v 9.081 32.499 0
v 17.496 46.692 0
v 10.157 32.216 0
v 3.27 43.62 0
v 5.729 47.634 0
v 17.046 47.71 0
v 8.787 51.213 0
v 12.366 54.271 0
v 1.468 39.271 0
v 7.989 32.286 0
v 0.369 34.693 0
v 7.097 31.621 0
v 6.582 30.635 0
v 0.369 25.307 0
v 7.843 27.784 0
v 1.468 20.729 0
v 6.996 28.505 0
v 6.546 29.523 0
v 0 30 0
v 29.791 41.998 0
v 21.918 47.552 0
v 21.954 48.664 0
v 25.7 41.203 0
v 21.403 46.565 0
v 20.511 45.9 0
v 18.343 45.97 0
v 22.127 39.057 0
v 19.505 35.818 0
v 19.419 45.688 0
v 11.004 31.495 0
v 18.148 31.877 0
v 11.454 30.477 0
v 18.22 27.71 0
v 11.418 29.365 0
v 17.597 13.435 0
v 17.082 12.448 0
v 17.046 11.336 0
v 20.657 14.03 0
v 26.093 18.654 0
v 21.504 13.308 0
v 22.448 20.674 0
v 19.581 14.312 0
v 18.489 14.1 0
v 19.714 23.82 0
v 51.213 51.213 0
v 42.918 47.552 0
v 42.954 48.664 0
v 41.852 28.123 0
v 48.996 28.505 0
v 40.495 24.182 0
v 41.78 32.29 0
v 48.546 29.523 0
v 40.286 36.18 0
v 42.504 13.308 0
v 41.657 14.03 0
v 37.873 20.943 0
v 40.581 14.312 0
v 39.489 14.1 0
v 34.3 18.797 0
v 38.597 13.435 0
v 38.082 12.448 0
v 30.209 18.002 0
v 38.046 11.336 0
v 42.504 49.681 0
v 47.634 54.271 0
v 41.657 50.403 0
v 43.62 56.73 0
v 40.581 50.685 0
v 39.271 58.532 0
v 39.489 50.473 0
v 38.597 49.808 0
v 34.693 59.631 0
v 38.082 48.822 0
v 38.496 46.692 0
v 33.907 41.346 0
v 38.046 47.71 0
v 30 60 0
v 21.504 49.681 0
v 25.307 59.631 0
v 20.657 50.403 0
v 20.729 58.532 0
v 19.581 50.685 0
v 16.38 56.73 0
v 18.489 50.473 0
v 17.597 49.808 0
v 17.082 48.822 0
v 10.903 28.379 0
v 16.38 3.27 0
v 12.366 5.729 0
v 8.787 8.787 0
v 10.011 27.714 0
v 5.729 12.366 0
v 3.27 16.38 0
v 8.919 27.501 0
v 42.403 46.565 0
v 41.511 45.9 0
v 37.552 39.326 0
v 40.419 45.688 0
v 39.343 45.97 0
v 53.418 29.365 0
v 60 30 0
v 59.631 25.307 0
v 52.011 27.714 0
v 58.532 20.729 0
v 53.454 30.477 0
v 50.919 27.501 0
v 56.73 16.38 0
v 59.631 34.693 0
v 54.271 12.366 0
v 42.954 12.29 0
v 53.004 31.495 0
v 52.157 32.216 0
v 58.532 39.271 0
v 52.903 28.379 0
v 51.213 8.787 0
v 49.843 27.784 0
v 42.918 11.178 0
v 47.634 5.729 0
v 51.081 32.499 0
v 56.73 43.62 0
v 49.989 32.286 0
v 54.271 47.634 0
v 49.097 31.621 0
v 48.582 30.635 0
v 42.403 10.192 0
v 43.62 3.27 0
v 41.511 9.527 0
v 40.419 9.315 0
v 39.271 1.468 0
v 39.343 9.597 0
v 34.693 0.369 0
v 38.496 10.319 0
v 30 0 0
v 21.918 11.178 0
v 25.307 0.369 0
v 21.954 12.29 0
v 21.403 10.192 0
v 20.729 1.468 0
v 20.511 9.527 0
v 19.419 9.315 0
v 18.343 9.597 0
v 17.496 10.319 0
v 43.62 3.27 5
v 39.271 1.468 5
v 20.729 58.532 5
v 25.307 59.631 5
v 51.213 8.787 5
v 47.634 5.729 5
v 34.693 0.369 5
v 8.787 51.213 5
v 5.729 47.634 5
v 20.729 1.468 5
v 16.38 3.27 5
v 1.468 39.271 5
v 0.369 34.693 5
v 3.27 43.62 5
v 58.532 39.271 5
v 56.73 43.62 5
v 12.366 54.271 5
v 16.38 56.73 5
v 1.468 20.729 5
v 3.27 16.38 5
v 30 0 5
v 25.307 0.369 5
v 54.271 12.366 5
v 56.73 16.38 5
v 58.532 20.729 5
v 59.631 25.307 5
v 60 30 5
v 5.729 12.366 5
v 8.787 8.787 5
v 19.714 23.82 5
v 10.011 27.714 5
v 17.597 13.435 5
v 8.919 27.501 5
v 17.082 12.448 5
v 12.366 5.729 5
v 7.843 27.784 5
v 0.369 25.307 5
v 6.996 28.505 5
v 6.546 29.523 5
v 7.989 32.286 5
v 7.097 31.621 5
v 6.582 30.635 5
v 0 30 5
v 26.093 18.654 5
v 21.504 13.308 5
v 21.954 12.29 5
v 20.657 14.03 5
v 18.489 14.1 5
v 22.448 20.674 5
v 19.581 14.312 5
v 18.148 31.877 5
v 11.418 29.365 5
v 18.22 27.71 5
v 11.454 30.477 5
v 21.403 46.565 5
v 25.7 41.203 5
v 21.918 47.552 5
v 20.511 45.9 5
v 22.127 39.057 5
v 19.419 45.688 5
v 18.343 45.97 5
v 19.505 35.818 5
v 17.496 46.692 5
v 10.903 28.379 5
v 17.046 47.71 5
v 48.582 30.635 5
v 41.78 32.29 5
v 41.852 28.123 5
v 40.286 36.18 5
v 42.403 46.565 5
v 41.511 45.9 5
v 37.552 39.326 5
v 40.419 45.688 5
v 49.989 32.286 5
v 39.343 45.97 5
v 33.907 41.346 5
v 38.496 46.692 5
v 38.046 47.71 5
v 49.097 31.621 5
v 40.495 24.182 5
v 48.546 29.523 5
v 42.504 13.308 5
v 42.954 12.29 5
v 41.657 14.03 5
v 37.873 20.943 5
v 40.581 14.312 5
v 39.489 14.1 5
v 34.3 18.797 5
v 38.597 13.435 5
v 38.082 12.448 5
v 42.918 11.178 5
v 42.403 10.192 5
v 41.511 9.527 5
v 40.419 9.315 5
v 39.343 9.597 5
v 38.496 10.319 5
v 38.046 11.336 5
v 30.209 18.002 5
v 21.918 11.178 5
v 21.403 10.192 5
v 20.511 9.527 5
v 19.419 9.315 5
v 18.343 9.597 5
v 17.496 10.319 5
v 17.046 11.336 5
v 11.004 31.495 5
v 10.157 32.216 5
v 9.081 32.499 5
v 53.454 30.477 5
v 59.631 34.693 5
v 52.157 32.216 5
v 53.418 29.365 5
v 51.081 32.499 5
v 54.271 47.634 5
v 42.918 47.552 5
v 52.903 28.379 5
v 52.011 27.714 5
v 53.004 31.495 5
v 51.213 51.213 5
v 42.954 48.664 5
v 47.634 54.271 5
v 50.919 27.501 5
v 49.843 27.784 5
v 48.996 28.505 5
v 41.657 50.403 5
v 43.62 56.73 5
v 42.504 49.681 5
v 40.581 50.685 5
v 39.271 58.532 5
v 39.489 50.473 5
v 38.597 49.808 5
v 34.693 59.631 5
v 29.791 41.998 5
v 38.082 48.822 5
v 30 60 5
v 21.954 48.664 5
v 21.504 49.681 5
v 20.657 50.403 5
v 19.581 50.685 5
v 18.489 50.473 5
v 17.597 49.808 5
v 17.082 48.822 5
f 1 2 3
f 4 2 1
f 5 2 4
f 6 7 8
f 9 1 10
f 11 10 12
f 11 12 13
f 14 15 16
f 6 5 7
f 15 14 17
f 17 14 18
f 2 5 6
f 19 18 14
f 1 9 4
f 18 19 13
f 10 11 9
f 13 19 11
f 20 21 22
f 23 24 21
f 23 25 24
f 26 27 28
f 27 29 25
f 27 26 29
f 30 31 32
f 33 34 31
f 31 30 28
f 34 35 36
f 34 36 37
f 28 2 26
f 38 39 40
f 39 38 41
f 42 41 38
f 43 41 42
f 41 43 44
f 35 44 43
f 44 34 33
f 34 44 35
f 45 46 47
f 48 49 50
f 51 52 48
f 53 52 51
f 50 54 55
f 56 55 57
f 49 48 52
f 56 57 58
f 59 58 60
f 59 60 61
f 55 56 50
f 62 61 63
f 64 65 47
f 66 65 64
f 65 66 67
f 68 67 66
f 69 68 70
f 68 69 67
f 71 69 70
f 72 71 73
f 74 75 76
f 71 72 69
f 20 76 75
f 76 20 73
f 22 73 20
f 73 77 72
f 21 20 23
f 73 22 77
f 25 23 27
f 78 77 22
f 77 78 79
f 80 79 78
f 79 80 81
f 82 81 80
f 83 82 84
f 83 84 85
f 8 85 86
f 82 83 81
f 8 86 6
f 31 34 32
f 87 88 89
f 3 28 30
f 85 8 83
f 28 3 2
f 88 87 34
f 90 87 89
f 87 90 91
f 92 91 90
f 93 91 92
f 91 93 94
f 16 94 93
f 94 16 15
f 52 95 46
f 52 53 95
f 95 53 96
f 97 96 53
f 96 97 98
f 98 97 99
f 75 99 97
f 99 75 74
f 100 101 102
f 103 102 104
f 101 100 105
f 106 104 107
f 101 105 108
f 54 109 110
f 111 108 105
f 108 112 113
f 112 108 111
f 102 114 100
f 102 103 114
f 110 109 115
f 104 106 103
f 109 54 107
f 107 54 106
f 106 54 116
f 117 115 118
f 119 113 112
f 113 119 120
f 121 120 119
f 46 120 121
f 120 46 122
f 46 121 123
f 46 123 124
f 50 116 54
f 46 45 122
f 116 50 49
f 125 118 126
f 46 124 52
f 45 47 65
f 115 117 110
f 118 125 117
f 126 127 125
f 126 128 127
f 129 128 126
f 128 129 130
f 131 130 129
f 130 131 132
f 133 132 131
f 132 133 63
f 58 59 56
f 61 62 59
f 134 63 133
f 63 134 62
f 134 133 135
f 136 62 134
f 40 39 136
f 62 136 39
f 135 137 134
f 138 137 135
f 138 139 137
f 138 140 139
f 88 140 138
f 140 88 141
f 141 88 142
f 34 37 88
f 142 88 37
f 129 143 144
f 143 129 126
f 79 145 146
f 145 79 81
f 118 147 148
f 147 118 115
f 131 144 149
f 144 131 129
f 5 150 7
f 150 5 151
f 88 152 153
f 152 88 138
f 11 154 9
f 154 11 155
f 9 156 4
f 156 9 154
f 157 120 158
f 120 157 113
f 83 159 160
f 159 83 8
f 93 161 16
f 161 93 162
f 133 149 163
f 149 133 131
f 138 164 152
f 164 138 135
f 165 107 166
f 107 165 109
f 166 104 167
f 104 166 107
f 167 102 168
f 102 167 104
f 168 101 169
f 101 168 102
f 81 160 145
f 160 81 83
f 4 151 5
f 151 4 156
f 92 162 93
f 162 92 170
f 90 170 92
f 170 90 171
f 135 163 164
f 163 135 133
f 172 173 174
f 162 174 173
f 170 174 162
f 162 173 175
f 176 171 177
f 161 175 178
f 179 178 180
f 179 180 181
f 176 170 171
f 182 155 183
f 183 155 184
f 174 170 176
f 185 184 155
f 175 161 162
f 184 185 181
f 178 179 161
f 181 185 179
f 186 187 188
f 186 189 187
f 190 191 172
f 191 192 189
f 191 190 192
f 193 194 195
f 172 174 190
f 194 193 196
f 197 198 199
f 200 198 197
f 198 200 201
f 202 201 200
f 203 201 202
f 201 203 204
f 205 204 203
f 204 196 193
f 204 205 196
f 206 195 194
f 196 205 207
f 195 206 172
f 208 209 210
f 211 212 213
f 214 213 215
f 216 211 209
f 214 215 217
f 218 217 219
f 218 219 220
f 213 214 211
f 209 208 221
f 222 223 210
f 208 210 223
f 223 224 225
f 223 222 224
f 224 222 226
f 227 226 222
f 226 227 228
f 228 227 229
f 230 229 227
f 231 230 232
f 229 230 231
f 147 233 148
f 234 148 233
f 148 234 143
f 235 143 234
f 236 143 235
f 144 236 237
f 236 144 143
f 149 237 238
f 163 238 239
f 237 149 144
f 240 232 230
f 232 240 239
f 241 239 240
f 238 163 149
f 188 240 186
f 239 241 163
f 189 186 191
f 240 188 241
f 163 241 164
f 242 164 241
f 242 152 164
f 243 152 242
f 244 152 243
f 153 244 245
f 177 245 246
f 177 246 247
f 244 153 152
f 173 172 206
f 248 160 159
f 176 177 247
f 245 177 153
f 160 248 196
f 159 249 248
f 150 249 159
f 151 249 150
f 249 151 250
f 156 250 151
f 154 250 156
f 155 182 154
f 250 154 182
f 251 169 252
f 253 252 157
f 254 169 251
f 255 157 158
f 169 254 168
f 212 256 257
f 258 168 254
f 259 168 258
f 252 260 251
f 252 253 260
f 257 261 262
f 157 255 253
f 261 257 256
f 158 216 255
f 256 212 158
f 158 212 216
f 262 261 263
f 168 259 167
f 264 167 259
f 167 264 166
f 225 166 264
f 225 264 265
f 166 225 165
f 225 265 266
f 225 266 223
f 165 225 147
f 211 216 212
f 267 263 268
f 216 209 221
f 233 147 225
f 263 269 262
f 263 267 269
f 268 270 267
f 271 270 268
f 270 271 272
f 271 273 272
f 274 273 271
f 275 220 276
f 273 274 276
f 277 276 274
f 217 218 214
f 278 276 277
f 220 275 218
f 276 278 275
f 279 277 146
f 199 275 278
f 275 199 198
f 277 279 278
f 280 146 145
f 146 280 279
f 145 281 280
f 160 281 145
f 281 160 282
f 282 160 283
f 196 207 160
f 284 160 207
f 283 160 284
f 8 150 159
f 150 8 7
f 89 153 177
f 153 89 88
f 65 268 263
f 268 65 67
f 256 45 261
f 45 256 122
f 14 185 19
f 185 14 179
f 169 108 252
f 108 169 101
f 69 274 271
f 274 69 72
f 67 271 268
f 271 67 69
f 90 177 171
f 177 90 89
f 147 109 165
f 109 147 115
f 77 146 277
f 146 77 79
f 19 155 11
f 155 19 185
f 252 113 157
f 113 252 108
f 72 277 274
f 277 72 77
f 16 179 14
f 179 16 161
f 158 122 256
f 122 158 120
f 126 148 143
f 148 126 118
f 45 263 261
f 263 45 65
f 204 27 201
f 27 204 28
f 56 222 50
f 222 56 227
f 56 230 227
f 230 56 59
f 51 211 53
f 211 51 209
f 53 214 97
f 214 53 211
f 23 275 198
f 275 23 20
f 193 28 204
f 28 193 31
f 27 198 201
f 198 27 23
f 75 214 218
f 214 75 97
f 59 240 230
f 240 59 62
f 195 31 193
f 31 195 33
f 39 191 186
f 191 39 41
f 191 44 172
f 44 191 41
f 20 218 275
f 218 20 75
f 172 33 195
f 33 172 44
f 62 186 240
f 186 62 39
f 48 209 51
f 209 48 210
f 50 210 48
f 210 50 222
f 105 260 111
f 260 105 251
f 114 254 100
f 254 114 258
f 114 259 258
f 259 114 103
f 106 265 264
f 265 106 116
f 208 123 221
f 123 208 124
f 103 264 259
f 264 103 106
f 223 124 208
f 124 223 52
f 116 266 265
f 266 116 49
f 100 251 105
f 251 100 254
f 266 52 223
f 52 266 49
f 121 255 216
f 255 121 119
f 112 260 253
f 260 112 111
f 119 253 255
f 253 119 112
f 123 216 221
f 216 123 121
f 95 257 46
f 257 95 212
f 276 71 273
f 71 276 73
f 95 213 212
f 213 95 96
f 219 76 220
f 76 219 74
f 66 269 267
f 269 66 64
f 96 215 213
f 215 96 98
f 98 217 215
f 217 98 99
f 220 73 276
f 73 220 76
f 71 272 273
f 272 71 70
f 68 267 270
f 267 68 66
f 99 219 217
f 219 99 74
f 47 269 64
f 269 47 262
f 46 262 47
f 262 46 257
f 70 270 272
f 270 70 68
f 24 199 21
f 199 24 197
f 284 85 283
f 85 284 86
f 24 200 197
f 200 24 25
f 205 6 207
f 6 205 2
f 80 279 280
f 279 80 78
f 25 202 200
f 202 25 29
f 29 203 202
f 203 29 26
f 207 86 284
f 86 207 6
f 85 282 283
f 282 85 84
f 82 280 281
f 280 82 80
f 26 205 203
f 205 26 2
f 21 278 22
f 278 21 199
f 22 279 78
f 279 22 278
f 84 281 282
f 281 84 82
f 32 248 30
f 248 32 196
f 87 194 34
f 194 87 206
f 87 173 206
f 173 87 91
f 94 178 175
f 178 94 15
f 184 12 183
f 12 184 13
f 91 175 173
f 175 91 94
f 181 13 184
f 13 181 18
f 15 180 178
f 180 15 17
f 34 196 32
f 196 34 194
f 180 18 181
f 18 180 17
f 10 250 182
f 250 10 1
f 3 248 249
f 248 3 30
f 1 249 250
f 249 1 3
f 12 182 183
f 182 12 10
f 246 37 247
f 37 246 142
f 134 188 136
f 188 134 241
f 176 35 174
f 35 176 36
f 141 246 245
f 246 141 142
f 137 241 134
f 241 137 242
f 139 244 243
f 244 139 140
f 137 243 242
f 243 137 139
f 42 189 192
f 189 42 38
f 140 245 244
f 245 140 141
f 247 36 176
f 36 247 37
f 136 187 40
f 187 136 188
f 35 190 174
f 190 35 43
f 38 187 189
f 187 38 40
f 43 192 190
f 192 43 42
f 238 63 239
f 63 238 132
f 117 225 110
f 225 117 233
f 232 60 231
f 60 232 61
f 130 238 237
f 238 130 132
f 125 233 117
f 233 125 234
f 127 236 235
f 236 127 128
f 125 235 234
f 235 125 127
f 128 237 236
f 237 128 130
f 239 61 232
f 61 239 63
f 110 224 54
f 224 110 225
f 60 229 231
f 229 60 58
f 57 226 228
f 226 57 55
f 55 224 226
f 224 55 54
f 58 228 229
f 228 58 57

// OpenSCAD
$fn = 32;

// ----------------------------------------------------------------------
// Spacer plate: round flange R30, 6 bolts
// ----------------------------------------------------------------------

// --- parameters (mm) ---
bore_r = 12;              // centre bore radius
bolt_r = 2.5;             // bolt hole radius
plate_t = 5;              // plate thickness, Z (extrusion height)
flange_r = 30;            // flange radius
n_bolt = 6;               // bolt hole count
ring_r = 21;              // bolt circle radius

profile = [[60, 30], [59.631, 34.693], [58.532, 39.271], [56.73, 43.62], [54.271, 47.634], [51.213, 51.213], [47.634, 54.271], [43.62, 56.73], [39.271, 58.532], [34.693, 59.631], [30, 60], [25.307, 59.631], [20.729, 58.532], [16.38, 56.73], [12.366, 54.271], [8.787, 51.213], [5.729, 47.634], [3.27, 43.62], [1.468, 39.271], [0.369, 34.693], [0, 30], [0.369, 25.307], [1.468, 20.729], [3.27, 16.38], [5.729, 12.366], [8.787, 8.787], [12.366, 5.729], [16.38, 3.27], [20.729, 1.468], [25.307, 0.369], [30, 0], [34.693, 0.369], [39.271, 1.468], [43.62, 3.27], [47.634, 5.729], [51.213, 8.787], [54.271, 12.366], [56.73, 16.38], [58.532, 20.729], [59.631, 25.307]];  // primary outline, 40 points, counter clockwise
void_1 = [[41.78, 32.29], [40.286, 36.18], [37.552, 39.326], [33.907, 41.346], [29.791, 41.998], [25.7, 41.203], [22.127, 39.057], [19.505, 35.818], [18.148, 31.877], [18.22, 27.71], [19.714, 23.82], [22.448, 20.674], [26.093, 18.654], [30.209, 18.002], [34.3, 18.797], [37.873, 20.943], [40.495, 24.182], [41.852, 28.123]];  // centre bore, 18 points
void_2 = [[53.454, 30.477], [53.004, 31.495], [52.157, 32.216], [51.081, 32.499], [49.989, 32.286], [49.097, 31.621], [48.582, 30.635], [48.546, 29.523], [48.996, 28.505], [49.843, 27.784], [50.919, 27.501], [52.011, 27.714], [52.903, 28.379], [53.418, 29.365]];  // bolt hole 1, 14 points
void_3 = [[42.954, 48.664], [42.504, 49.681], [41.657, 50.403], [40.581, 50.685], [39.489, 50.473], [38.597, 49.808], [38.082, 48.822], [38.046, 47.71], [38.496, 46.692], [39.343, 45.97], [40.419, 45.688], [41.511, 45.9], [42.403, 46.565], [42.918, 47.552]];  // bolt hole 2, 14 points
void_4 = [[21.954, 48.664], [21.504, 49.681], [20.657, 50.403], [19.581, 50.685], [18.489, 50.473], [17.597, 49.808], [17.082, 48.822], [17.046, 47.71], [17.496, 46.692], [18.343, 45.97], [19.419, 45.688], [20.511, 45.9], [21.403, 46.565], [21.918, 47.552]];  // bolt hole 3, 14 points
void_5 = [[11.454, 30.477], [11.004, 31.495], [10.157, 32.216], [9.081, 32.499], [7.989, 32.286], [7.097, 31.621], [6.582, 30.635], [6.546, 29.523], [6.996, 28.505], [7.843, 27.784], [8.919, 27.501], [10.011, 27.714], [10.903, 28.379], [11.418, 29.365]];  // bolt hole 4, 14 points
void_6 = [[21.954, 12.29], [21.504, 13.308], [20.657, 14.03], [19.581, 14.312], [18.489, 14.1], [17.597, 13.435], [17.082, 12.448], [17.046, 11.336], [17.496, 10.319], [18.343, 9.597], [19.419, 9.315], [20.511, 9.527], [21.403, 10.192], [21.918, 11.178]];  // bolt hole 5, 14 points
void_7 = [[42.954, 12.29], [42.504, 13.308], [41.657, 14.03], [40.581, 14.312], [39.489, 14.1], [38.597, 13.435], [38.082, 12.448], [38.046, 11.336], [38.496, 10.319], [39.343, 9.597], [40.419, 9.315], [41.511, 9.527], [42.403, 10.192], [42.918, 11.178]];  // bolt hole 6, 14 points

// --- the one profile operation ---
difference() {
  linear_extrude(height = plate_t) polygon(points = profile);
  translate([0, 0, -1])
    linear_extrude(height = plate_t + 2) polygon(points = void_1);
  translate([0, 0, -1])
    linear_extrude(height = plate_t + 2) polygon(points = void_2);
  translate([0, 0, -1])
    linear_extrude(height = plate_t + 2) polygon(points = void_3);
  translate([0, 0, -1])
    linear_extrude(height = plate_t + 2) polygon(points = void_4);
  translate([0, 0, -1])
    linear_extrude(height = plate_t + 2) polygon(points = void_5);
  translate([0, 0, -1])
    linear_extrude(height = plate_t + 2) polygon(points = void_6);
  translate([0, 0, -1])
    linear_extrude(height = plate_t + 2) polygon(points = void_7);
}
